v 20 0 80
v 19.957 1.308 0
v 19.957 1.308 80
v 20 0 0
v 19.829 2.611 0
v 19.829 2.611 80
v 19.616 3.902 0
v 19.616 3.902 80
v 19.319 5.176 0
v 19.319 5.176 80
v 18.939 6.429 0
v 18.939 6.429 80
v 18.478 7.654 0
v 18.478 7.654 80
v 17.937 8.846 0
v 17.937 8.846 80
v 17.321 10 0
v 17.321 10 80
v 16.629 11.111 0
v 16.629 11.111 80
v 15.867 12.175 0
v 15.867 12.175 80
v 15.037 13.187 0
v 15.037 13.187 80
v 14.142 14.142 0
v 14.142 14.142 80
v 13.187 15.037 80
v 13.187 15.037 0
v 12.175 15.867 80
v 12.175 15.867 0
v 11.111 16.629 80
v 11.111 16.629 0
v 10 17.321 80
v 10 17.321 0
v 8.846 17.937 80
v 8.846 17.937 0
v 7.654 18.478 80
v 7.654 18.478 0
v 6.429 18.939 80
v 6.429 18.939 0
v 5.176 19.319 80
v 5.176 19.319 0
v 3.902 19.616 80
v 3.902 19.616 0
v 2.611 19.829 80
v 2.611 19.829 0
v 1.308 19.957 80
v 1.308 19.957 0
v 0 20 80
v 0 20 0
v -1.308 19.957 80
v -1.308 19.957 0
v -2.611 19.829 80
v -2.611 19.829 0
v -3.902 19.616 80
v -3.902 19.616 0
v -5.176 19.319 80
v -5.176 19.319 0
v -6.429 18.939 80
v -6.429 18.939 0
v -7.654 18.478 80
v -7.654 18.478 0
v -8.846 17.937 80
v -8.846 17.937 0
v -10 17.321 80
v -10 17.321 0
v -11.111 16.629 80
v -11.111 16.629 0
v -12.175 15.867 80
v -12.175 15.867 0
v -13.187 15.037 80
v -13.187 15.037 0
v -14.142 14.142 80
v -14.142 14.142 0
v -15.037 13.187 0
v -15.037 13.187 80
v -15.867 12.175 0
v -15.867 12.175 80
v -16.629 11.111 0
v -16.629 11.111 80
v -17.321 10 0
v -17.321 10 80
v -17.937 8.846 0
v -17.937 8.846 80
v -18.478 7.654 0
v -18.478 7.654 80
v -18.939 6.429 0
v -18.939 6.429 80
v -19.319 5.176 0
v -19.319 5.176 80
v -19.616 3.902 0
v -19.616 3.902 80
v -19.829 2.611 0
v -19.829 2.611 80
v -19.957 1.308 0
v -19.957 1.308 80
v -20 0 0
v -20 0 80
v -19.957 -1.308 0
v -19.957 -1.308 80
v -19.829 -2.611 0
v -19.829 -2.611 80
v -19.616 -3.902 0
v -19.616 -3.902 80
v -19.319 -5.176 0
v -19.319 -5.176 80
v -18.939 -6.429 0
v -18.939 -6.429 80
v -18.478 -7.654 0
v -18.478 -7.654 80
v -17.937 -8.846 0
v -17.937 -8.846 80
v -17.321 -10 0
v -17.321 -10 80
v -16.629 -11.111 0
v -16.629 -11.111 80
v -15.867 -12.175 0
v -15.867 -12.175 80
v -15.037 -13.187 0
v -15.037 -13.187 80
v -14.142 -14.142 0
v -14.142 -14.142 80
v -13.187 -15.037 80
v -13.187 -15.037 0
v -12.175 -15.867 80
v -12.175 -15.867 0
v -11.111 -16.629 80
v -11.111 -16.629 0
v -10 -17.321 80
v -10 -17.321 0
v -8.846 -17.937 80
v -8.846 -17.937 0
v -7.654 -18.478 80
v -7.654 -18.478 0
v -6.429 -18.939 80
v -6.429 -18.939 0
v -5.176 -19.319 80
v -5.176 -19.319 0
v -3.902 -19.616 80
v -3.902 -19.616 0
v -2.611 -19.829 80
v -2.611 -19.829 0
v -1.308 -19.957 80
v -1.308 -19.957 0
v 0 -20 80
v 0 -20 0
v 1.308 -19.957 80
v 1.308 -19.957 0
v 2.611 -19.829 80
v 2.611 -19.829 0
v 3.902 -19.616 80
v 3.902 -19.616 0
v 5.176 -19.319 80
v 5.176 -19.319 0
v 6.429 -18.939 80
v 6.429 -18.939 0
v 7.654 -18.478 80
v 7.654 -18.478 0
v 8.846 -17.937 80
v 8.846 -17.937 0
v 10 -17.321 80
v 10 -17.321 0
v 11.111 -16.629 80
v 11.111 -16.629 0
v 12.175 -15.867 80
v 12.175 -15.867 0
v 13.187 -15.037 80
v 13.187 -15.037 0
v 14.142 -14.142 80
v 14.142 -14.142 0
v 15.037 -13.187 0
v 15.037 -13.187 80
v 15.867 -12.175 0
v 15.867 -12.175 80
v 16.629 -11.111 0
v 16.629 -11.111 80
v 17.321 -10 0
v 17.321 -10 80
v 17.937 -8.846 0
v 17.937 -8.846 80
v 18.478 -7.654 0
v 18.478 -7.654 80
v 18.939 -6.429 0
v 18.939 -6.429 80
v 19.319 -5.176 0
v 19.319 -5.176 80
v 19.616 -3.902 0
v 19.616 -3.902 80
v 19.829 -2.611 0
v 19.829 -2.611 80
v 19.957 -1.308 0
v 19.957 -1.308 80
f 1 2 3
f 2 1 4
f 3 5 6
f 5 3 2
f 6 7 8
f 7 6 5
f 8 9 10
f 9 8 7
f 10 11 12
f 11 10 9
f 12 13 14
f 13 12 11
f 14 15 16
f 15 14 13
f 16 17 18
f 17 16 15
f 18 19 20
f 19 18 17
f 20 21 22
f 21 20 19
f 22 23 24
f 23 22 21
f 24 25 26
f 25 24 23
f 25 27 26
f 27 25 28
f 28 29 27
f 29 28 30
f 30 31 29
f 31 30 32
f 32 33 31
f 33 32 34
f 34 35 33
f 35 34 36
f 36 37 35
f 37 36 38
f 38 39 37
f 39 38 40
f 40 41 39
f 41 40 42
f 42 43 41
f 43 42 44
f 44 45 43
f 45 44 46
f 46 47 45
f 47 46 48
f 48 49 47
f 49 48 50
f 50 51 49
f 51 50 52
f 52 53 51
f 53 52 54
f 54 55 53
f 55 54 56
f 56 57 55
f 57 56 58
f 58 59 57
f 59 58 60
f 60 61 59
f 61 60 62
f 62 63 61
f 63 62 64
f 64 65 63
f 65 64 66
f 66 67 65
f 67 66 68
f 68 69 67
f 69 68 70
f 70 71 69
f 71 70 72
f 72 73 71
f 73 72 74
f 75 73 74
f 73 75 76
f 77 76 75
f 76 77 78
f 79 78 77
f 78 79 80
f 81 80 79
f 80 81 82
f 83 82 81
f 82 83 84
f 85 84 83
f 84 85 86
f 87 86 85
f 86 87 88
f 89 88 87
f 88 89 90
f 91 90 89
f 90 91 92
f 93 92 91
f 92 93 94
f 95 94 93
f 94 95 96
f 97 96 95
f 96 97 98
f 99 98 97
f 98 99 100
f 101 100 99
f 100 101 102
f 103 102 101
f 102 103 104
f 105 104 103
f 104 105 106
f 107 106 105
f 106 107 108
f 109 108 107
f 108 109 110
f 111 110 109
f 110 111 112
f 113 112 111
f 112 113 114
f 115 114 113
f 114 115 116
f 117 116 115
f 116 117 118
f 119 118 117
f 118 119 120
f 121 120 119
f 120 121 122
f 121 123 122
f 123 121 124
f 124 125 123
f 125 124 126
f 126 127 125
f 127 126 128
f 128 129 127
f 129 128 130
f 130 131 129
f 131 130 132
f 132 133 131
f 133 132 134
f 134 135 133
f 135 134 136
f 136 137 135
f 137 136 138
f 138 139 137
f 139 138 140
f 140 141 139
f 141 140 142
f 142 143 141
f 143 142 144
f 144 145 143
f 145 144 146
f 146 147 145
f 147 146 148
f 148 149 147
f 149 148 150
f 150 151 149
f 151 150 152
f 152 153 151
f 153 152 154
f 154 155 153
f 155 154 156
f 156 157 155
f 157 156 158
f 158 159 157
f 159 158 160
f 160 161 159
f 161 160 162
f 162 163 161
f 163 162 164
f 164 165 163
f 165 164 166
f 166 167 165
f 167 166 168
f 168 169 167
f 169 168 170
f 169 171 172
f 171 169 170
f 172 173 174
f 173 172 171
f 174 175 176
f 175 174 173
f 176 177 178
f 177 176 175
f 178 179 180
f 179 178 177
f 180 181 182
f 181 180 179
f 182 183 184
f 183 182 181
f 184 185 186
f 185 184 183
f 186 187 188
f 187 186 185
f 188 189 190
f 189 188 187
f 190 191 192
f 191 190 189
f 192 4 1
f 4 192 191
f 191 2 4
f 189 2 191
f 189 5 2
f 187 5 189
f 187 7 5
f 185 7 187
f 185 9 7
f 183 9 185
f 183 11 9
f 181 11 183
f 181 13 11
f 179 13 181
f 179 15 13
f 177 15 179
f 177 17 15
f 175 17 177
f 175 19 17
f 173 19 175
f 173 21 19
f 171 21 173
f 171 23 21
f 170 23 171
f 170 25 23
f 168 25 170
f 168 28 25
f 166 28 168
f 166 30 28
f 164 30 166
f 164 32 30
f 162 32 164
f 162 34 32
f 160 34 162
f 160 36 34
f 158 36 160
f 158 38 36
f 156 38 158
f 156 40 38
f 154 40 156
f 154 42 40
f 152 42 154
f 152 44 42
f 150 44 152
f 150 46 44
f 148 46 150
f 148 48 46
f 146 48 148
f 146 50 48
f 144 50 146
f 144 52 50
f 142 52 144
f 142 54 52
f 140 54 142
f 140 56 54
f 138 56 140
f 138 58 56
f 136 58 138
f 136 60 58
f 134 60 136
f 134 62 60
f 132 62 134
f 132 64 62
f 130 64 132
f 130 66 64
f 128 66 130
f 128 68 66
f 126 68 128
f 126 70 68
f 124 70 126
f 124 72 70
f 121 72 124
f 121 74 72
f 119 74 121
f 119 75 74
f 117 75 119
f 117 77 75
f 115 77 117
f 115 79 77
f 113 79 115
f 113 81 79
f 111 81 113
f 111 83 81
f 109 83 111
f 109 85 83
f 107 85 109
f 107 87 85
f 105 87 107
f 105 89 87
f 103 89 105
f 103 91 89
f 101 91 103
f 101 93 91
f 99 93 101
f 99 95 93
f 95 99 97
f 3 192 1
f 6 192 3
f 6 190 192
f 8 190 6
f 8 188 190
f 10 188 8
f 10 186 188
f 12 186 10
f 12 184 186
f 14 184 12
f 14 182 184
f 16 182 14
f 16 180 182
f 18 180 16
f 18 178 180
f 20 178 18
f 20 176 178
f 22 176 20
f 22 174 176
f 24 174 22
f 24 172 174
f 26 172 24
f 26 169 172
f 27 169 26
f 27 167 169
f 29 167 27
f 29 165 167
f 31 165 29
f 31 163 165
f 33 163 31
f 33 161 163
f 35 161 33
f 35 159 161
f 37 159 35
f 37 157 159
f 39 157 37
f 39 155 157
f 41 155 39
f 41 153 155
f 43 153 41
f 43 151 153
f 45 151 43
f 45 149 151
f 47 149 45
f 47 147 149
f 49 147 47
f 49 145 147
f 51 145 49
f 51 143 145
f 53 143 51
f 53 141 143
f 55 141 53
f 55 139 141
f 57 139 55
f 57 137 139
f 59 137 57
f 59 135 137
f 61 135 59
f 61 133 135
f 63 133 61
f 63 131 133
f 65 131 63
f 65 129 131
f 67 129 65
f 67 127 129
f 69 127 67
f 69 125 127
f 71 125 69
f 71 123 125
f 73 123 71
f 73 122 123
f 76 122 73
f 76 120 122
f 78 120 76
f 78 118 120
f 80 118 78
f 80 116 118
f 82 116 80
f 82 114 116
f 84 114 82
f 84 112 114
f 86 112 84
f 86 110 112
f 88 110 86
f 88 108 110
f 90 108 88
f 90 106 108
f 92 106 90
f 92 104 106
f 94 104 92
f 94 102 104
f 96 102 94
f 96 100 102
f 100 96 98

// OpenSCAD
radius = 20.0;
height = 80.0;
cylinder(r=radius, h=height, $fn=96);
